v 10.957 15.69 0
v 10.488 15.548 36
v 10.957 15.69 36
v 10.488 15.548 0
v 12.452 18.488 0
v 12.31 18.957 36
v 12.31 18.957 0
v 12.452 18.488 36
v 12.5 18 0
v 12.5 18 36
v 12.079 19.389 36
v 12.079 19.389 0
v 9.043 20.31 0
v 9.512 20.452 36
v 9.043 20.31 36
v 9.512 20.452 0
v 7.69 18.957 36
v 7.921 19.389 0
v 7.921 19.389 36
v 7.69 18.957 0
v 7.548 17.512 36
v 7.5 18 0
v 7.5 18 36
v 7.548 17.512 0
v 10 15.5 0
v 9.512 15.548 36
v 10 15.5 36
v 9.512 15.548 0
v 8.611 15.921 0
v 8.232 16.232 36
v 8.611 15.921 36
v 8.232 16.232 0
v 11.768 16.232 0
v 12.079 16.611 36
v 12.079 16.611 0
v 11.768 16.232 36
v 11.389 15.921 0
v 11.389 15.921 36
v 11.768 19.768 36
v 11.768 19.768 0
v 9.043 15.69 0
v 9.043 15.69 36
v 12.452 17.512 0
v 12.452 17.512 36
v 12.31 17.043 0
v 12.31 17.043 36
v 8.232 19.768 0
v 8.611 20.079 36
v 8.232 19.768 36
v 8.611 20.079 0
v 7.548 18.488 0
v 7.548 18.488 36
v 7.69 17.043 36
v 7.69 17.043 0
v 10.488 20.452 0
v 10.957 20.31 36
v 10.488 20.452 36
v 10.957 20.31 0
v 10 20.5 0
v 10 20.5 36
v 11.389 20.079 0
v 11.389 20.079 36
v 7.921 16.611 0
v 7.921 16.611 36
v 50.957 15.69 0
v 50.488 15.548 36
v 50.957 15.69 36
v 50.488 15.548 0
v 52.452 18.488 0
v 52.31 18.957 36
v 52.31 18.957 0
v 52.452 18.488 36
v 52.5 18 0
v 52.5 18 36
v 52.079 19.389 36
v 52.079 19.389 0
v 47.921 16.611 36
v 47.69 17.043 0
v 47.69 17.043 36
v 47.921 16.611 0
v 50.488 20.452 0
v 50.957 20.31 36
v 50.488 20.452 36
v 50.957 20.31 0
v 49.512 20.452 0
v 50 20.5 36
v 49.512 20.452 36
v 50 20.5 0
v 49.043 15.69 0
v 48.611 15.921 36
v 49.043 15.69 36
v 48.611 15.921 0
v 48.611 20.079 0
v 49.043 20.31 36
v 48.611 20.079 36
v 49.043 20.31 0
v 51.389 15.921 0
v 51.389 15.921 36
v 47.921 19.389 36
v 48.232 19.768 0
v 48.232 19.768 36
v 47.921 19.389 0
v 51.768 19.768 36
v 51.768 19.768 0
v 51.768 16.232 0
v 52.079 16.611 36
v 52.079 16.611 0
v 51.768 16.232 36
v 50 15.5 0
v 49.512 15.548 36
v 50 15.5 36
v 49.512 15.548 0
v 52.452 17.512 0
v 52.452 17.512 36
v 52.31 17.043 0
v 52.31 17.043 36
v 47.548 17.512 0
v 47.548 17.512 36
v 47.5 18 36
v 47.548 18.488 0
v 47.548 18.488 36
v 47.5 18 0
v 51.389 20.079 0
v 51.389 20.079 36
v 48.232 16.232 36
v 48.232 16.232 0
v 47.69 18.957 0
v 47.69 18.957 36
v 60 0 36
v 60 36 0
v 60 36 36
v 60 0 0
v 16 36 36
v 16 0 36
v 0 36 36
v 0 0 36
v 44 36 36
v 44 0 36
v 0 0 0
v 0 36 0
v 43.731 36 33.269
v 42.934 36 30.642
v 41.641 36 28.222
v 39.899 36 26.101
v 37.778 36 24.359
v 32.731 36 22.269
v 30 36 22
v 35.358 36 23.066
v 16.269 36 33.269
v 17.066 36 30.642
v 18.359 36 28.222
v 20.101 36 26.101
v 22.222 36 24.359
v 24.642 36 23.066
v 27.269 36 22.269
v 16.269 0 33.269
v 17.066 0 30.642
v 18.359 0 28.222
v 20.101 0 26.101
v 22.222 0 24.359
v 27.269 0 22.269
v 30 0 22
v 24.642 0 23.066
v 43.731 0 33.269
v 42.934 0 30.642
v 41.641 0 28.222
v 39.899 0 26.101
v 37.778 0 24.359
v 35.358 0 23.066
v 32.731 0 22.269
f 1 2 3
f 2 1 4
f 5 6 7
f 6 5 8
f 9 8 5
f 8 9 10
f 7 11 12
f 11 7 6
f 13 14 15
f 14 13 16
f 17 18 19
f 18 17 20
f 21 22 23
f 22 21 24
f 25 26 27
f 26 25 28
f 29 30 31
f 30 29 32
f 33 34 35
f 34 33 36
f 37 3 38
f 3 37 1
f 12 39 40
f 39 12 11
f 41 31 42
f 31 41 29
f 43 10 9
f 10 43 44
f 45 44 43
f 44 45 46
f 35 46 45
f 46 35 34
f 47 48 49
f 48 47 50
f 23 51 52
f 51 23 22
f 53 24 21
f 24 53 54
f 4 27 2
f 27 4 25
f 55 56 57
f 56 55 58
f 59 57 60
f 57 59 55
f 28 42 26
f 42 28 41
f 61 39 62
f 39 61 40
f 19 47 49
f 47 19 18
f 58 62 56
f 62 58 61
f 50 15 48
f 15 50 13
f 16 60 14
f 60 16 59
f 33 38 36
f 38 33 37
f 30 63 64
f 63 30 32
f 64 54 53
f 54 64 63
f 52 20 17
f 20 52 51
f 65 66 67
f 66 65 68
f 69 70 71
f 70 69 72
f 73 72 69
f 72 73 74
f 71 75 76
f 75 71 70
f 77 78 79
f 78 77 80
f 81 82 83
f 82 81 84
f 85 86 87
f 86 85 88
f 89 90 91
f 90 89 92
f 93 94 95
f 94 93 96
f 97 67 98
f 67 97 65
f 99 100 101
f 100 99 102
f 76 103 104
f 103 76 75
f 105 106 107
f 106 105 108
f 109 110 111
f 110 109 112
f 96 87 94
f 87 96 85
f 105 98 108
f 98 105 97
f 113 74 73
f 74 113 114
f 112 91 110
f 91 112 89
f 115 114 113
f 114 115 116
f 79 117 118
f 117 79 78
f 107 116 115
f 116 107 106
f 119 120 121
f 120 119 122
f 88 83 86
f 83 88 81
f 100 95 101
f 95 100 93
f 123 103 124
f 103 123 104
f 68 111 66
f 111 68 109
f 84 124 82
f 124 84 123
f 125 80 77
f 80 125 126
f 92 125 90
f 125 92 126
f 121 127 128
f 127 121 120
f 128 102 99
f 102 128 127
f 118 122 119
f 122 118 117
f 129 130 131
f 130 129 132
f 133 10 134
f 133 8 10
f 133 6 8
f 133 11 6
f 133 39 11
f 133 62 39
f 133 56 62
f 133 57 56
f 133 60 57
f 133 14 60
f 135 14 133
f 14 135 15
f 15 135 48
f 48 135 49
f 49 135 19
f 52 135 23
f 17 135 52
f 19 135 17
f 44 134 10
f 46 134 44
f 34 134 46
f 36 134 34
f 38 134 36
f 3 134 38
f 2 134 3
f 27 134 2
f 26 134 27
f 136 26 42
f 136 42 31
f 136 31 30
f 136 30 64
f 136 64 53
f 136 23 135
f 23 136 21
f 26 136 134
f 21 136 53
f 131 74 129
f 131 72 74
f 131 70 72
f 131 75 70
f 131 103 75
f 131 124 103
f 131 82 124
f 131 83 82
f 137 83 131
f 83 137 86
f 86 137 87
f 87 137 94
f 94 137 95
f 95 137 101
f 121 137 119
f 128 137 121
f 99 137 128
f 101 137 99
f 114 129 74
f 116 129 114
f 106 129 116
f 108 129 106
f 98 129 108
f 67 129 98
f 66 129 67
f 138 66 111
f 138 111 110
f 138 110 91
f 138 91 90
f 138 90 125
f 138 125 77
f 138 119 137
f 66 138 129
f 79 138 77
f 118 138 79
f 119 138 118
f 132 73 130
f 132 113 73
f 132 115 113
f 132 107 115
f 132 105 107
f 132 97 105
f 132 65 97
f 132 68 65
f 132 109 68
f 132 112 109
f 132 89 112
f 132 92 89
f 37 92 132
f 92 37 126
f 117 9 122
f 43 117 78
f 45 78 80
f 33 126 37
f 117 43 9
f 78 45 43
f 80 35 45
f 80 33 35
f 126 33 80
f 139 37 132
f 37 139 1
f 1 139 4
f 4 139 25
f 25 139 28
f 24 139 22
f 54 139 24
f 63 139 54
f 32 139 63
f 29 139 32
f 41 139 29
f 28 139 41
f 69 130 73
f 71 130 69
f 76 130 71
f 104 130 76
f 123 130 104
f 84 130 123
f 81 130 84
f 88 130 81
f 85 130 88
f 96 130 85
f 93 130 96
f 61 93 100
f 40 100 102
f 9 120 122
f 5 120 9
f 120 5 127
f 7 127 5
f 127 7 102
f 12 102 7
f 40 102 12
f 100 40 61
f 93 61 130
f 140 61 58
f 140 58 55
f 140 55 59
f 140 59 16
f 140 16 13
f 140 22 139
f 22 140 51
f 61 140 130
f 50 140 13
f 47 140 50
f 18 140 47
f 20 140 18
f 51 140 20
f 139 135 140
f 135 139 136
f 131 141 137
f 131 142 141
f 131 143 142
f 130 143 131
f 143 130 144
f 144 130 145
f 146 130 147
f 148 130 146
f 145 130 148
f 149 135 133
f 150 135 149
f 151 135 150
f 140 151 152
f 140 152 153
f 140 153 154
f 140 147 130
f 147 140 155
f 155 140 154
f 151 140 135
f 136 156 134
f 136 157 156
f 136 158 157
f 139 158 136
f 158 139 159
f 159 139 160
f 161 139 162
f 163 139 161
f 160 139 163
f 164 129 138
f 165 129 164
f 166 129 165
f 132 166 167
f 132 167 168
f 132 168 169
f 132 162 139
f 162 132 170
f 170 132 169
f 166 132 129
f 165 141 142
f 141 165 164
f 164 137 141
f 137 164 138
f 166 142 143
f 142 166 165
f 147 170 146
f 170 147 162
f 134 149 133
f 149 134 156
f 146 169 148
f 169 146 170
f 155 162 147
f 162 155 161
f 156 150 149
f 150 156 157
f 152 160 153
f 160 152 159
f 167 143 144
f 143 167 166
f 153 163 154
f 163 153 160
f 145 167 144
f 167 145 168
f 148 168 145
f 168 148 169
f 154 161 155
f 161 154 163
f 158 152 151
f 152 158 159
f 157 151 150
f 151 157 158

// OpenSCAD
$fn = 32;

// ----------------------------------------------------------------------
// Saddle clamp: plain shaft clamp
// ----------------------------------------------------------------------

// --- parameters (mm) ---
blk_l = 60;               // block length, X
blk_w = 36;               // block width, Y
blk_h = 36;               // block height
clamp_r = 14;             // shaft groove radius
hole_r = 2.5;             // bolt hole radius
hole_m = 10;              // bolt hole margin from the ends

saw_depth = clamp_r + 3;  // saw kerf depth

difference() {
  cube([blk_l, blk_w, blk_h]);
  translate([blk_l / 2, -1, blk_h])
    rotate([-90, 0, 0])
      cylinder(h = blk_w + 2, r = clamp_r);
  for (sx = [0, 1])
    translate([sx ? blk_l - hole_m : hole_m, blk_w / 2, -1])
      cylinder(r = hole_r, h = blk_h + 2);
}
